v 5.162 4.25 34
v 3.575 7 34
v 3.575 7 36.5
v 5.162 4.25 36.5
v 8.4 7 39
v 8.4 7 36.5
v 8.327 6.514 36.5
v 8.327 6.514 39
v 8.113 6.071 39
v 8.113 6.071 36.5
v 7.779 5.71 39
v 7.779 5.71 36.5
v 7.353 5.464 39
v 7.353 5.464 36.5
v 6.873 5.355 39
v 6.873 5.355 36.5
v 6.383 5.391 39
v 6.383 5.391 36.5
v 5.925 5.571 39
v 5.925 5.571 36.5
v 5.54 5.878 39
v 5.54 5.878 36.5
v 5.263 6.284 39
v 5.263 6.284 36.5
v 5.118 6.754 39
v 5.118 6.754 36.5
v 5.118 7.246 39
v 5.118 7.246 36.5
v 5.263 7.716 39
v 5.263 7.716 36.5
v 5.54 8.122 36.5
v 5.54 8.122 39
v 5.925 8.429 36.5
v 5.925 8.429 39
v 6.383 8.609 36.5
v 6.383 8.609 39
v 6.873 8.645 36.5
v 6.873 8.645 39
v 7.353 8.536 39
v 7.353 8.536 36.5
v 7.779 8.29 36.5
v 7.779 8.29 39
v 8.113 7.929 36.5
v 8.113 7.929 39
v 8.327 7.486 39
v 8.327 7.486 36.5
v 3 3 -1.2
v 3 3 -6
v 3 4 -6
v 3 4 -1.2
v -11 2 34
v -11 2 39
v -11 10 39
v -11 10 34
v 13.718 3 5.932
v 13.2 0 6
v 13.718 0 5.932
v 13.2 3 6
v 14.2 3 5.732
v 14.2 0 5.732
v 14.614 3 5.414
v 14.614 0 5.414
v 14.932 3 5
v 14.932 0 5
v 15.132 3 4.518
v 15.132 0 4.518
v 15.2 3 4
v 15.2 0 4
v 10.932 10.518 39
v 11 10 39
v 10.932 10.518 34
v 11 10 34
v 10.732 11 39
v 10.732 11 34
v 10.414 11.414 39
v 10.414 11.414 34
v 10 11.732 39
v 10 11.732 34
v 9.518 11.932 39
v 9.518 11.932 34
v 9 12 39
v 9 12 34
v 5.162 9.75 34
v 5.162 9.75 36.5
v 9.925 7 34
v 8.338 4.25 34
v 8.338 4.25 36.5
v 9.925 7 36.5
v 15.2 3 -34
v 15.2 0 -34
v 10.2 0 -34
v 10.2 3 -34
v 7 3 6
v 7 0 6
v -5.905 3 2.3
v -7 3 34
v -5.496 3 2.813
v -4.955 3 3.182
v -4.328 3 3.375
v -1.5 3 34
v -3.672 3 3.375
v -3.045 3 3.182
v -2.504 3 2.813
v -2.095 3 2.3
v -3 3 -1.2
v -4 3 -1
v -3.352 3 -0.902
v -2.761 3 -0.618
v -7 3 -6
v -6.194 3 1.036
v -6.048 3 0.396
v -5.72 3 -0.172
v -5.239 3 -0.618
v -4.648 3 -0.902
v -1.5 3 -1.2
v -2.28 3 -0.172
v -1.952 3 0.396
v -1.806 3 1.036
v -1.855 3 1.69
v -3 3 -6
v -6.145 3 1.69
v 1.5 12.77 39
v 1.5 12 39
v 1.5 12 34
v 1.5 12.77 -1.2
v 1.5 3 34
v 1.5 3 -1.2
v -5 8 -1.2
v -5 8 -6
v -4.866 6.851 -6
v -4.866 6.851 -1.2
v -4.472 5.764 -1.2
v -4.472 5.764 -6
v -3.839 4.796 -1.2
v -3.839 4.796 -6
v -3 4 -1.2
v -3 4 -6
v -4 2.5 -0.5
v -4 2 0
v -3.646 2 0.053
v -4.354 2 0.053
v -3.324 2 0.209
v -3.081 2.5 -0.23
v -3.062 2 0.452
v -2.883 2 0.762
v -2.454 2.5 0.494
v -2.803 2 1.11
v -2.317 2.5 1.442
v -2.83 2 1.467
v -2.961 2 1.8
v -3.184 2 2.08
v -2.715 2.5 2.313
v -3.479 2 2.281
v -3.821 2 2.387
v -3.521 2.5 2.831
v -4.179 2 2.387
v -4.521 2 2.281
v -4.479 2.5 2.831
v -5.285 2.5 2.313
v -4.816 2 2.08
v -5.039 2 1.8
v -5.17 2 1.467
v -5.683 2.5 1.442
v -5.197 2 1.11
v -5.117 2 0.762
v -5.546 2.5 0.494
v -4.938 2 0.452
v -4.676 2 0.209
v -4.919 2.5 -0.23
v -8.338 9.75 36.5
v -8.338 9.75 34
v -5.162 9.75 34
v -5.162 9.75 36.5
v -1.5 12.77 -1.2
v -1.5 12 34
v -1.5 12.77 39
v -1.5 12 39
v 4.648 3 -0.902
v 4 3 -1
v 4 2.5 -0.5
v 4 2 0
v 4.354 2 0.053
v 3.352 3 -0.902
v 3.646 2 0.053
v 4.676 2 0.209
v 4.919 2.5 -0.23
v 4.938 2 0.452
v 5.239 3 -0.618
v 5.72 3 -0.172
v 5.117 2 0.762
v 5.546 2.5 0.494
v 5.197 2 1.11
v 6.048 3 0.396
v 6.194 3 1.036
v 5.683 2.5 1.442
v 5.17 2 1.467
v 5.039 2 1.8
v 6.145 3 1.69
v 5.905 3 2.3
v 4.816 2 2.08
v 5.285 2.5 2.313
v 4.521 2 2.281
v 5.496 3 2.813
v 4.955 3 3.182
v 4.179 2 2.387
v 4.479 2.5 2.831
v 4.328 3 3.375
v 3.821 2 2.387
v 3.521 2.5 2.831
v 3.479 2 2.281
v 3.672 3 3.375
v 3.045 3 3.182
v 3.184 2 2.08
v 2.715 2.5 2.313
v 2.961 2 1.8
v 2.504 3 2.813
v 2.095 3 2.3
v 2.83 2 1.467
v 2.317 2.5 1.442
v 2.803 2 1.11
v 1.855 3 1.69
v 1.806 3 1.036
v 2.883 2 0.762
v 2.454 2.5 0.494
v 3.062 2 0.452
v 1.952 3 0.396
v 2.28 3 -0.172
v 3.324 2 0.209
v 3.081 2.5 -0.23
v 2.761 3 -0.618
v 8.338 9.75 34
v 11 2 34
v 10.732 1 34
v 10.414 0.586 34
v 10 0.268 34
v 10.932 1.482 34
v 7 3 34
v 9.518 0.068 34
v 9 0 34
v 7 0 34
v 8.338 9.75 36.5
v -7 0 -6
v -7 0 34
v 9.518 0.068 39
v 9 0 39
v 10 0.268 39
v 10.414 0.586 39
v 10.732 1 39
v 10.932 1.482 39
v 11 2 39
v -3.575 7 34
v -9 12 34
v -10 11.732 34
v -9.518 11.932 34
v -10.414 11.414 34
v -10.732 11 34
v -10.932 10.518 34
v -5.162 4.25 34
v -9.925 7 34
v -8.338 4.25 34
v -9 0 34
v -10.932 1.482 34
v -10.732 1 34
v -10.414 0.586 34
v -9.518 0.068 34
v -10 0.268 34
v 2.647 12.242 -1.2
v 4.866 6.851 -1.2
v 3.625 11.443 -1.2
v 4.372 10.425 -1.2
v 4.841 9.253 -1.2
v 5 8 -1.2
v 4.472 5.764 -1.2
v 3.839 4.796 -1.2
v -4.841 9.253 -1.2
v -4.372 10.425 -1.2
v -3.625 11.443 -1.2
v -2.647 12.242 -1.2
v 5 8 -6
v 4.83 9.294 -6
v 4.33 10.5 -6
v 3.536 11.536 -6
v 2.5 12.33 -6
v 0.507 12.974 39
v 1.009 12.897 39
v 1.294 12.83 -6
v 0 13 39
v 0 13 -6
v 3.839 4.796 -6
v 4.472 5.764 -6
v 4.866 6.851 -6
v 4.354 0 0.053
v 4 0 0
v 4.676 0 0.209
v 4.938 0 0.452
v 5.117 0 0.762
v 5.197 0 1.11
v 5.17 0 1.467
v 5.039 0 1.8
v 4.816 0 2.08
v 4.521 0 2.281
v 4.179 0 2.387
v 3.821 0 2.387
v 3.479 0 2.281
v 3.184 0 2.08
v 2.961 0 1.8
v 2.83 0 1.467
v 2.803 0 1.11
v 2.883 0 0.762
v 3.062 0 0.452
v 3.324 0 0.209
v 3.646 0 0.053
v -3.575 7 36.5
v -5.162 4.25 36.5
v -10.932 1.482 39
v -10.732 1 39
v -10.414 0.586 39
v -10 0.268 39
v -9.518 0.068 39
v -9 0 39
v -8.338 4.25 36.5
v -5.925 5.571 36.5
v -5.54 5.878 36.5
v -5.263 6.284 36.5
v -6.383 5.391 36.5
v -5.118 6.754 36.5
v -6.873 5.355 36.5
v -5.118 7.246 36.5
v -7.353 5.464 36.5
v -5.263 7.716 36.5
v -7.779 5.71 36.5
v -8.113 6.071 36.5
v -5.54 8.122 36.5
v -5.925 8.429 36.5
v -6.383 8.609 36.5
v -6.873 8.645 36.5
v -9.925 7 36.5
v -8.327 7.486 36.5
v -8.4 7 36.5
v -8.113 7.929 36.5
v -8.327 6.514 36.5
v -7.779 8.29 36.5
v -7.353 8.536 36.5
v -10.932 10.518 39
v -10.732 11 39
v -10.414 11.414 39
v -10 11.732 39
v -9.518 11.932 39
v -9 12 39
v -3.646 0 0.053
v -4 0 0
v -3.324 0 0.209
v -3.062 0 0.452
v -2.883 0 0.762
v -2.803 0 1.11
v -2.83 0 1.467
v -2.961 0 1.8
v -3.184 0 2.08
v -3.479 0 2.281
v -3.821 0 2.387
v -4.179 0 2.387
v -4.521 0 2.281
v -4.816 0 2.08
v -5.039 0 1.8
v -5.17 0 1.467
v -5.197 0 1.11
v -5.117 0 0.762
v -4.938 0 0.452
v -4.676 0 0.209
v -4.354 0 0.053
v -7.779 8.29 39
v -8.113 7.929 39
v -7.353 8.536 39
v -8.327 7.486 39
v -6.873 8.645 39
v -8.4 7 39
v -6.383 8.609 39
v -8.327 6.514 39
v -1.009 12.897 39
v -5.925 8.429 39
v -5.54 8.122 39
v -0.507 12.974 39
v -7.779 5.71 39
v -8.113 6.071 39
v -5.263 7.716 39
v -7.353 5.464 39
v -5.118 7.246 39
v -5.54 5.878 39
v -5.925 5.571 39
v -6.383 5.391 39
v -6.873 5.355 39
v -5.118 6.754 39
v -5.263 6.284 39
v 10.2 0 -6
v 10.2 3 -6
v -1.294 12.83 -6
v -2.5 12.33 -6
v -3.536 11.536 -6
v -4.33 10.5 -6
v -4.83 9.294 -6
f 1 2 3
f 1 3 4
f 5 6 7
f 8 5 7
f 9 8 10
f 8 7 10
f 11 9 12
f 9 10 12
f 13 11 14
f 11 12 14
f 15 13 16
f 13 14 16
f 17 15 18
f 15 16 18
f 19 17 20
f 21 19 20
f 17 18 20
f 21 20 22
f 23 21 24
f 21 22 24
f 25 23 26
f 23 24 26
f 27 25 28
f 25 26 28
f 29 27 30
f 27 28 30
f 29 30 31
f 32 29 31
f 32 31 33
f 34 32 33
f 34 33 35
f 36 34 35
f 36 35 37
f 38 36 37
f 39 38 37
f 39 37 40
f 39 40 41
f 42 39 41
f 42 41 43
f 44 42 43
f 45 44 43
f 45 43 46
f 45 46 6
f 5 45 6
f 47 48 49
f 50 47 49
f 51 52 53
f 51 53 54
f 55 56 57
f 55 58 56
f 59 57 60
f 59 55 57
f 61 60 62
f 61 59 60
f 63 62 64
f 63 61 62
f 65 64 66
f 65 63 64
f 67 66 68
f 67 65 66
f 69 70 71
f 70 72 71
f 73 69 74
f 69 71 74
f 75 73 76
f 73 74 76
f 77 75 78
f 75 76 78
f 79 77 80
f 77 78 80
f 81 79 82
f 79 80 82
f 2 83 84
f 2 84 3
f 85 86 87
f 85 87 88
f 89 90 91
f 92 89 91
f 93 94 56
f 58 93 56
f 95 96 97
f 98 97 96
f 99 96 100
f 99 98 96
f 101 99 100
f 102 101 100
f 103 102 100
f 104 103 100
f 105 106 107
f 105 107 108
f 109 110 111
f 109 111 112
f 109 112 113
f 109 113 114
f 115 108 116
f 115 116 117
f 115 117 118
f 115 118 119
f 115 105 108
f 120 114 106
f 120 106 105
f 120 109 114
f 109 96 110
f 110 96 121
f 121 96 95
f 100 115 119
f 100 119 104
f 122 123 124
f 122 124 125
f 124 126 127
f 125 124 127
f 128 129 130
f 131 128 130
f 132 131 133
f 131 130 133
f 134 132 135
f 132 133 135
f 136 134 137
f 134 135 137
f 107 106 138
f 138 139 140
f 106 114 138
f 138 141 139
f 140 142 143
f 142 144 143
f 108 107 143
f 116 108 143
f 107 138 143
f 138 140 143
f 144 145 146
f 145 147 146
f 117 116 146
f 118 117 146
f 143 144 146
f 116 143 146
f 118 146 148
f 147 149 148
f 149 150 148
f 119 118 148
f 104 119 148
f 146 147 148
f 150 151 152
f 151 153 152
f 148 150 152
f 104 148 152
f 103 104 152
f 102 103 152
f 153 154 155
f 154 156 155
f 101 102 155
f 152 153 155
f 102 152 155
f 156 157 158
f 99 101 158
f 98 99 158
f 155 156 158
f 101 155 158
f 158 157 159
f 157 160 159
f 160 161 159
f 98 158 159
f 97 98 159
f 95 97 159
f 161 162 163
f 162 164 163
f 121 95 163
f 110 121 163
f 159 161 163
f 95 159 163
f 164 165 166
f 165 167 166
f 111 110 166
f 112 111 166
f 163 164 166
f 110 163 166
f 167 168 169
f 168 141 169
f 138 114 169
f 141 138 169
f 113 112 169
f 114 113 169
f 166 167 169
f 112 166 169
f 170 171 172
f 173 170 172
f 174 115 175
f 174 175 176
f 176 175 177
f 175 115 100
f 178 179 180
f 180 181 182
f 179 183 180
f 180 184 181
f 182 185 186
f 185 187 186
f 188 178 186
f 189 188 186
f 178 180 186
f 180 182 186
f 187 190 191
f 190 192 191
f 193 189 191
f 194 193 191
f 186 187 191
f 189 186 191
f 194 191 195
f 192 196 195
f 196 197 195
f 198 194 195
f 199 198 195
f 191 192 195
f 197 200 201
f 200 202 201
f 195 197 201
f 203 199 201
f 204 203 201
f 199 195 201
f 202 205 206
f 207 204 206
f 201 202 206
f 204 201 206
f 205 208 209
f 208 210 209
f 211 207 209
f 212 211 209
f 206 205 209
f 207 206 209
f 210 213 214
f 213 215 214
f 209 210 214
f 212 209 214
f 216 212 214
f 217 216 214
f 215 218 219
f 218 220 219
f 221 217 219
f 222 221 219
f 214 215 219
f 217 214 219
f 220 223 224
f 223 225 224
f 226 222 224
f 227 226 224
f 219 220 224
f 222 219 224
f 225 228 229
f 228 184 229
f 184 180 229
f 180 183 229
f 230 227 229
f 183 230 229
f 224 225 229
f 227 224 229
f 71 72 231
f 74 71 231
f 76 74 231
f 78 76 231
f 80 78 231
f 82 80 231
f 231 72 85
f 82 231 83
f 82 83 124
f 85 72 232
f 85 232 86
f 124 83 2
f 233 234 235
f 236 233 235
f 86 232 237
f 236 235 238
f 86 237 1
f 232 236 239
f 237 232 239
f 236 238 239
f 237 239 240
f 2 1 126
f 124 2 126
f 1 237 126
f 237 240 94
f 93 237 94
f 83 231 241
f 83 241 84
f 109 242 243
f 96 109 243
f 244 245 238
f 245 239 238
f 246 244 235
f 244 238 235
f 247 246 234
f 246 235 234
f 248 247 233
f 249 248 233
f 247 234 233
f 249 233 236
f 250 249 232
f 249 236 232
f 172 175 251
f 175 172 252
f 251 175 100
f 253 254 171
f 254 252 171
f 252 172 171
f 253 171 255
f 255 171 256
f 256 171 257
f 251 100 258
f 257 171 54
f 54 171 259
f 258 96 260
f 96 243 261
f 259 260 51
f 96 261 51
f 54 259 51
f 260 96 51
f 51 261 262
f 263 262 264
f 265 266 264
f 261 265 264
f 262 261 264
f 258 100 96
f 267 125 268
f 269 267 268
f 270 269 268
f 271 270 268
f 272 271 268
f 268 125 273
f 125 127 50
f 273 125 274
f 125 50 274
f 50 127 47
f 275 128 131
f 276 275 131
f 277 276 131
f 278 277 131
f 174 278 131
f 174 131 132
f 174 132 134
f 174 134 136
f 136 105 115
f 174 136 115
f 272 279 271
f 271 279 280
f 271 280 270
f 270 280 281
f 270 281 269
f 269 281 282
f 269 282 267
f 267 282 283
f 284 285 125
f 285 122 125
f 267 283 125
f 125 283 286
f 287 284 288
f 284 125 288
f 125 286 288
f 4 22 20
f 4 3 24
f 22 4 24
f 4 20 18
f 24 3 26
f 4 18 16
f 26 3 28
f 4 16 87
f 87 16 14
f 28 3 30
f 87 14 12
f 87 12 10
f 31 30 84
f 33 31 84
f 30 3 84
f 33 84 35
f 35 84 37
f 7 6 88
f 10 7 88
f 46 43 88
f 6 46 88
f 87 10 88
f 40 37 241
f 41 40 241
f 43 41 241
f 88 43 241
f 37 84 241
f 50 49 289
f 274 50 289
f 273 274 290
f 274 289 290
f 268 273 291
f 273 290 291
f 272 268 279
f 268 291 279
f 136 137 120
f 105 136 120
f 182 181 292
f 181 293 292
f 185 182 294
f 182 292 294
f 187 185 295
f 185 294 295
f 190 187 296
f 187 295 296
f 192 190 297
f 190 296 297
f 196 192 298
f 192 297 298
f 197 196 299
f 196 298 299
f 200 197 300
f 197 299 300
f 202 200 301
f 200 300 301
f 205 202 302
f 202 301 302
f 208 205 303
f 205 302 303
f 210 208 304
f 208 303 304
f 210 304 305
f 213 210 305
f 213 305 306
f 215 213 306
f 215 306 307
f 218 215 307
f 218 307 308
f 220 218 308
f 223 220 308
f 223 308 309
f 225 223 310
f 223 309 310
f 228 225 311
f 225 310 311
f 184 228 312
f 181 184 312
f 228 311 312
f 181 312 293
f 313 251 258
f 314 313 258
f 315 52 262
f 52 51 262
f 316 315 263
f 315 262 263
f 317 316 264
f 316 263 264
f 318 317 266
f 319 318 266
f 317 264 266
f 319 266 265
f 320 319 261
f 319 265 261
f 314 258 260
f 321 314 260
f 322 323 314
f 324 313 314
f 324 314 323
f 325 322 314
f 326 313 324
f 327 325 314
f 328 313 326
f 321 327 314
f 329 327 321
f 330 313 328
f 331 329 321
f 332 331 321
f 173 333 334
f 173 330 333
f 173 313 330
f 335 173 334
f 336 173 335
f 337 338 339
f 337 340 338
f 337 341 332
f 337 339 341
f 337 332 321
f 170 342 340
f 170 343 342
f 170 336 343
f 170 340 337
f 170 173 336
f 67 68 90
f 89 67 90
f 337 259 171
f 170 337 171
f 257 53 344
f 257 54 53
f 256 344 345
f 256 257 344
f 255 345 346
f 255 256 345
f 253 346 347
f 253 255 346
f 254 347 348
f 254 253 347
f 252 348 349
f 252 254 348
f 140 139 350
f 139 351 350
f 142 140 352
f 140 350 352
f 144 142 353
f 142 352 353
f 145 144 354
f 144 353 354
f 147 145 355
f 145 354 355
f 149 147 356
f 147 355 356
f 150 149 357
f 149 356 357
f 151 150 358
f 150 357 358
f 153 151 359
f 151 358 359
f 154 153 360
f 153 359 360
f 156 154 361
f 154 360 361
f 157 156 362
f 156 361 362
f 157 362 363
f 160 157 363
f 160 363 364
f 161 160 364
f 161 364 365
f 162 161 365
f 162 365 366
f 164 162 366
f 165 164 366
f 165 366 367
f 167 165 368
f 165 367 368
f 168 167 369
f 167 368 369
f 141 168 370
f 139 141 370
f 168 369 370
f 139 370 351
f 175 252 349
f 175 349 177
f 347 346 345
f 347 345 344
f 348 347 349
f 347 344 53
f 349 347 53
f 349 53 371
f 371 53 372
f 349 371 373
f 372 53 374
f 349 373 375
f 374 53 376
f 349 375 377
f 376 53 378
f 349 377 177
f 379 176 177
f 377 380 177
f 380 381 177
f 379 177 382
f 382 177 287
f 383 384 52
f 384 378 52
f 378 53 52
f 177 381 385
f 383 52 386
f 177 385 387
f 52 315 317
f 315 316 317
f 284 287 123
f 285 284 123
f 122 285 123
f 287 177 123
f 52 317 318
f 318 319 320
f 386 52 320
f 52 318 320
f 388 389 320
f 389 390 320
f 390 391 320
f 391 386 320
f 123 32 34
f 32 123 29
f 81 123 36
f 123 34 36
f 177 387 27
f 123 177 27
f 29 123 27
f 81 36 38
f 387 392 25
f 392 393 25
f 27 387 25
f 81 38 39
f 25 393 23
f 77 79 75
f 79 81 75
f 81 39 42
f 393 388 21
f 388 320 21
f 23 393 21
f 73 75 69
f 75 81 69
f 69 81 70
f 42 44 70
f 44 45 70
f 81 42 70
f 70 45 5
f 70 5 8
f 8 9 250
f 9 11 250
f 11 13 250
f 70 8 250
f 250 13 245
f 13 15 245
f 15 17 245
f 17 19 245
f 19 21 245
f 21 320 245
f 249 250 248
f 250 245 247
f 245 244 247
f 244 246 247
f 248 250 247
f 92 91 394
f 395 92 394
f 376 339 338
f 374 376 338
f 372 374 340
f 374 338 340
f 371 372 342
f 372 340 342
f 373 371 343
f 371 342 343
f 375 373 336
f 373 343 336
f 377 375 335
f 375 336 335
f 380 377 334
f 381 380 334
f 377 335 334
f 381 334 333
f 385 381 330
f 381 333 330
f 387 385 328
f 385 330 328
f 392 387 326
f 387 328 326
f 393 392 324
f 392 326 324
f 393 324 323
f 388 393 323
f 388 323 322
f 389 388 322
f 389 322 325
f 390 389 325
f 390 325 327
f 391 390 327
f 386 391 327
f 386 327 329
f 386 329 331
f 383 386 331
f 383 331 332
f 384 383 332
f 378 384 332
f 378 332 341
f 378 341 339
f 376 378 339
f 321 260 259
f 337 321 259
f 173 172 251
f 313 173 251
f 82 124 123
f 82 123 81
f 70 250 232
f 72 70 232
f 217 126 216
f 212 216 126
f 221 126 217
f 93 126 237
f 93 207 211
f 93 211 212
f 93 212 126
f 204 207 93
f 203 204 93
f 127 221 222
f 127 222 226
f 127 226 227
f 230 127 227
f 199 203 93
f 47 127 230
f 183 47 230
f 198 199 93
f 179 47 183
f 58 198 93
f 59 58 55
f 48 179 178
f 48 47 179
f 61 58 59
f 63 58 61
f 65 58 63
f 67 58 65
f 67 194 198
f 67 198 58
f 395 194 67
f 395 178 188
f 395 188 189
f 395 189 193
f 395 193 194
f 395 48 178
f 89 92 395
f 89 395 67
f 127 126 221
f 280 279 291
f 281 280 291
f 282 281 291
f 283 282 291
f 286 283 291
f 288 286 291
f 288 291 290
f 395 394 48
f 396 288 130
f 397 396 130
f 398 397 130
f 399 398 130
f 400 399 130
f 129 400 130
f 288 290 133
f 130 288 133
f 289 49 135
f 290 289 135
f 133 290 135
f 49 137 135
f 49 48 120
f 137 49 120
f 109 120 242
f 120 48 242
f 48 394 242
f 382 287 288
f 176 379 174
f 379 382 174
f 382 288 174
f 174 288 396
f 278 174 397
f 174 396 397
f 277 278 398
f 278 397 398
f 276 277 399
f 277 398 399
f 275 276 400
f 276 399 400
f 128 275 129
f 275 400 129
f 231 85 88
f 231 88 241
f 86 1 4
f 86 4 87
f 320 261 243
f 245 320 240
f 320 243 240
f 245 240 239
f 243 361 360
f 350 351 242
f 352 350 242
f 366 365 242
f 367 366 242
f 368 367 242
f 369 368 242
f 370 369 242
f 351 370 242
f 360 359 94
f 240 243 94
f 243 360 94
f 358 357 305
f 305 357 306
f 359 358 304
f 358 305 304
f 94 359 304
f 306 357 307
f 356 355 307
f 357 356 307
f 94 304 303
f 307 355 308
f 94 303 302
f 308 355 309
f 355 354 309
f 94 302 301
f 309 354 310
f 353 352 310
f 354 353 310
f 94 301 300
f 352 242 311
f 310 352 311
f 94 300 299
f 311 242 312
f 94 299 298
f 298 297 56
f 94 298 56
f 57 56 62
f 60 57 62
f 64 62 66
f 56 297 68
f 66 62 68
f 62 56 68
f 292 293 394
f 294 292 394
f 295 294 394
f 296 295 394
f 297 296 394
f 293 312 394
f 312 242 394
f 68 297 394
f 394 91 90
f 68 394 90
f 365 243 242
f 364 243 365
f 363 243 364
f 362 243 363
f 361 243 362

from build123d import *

# Parameters (mm, degrees)
SKETCH1_R                                           = 1.15
BOSS_EXTRUDE1_DEPTH                                 = 3
BOSS_EXTRUDE3_DEPTH                                 = 10
CSK_FOR_M2_COUNTERSUNK_FLAT_HEAD_SCREW2_D           = 2.4
CSK_FOR_M2_COUNTERSUNK_FLAT_HEAD_SCREW2_CSINK_D     = 4.4
CSK_FOR_M2_COUNTERSUNK_FLAT_HEAD_SCREW2_CSINK_ANGLE = 90
CUT_EXTRUDE2_DEPTH                                  = 50.244695146
SKETCH1_4_W                                         = 22
SKETCH1_4_H                                         = 5
BOSS_EXTRUDE4_DEPTH                                 = 12
SKETCH7_R                                           = 1.65
CUT_EXTRUDE3_DEPTH                                  = 71.880462752
CUT_EXTRUDE4_DEPTH                                  = 2.5
FILLET2_R                                           = 2


with BuildPart() as part:
    # Sketch1 → Boss-Extrude1 (new body)
    with BuildSketch(Plane(origin=(0, 0, 0), x_dir=(1, 0, 0), z_dir=(0, 1, 0))):
        Polygon((7, -6), (15.2, -6), (15.2, 34), (10.2, 34), (10.2, 6), (-7, 6), (-7, -39), (7, -39), align=None)
        with Locations((4, -1.2)):
            Circle(SKETCH1_R, mode=Mode.SUBTRACT)
        with Locations((-4, -1.2)):
            Circle(SKETCH1_R, mode=Mode.SUBTRACT)
    extrude(amount=BOSS_EXTRUDE1_DEPTH)

    # Sketch3 → Boss-Extrude3 (add)
    with BuildSketch(Plane(origin=(0, 3, 0), x_dir=(1, 0, 0), z_dir=(0, 1, 0))):
        Polygon((-5, 1.2), (-1.5, 1.2), (-1.5, -39), (1.5, -39), (1.5, 1.2), (5, 1.2), (5, 6), (-5, 6), align=None)
    extrude(amount=BOSS_EXTRUDE3_DEPTH)

    # CSK for M2 Countersunk Flat Head Screw2 (through all)
    with Locations(Plane(origin=(-4, 3, 1.2), x_dir=(0, 0, 1), z_dir=(0, 1, 0))):
        with Locations((0, 0), (0, 8)):
            CounterSinkHole(CSK_FOR_M2_COUNTERSUNK_FLAT_HEAD_SCREW2_D / 2, CSK_FOR_M2_COUNTERSUNK_FLAT_HEAD_SCREW2_CSINK_D / 2, counter_sink_angle=CSK_FOR_M2_COUNTERSUNK_FLAT_HEAD_SCREW2_CSINK_ANGLE)

    # Sketch6 → Cut-Extrude2 (cut, through all)
    with BuildSketch(Plane(origin=(0, 0, -6), x_dir=(-1, 0, 0), z_dir=(0, 0, -1))):
        with BuildLine():
            Line((-5, 3), (-3, 3))
            Line((-3, 3), (-3, 4))
            ThreePointArc((-3, 4), (-4.472135952, 5.763932017), (-5, 7.999999988))
            Line((-5, 7.999999988), (-5, 3))
        make_face()
        with BuildLine():
            Line((5, 3), (5, 8))
            ThreePointArc((5, 8), (4.472135955, 5.763932023), (3, 4))
            Line((3, 4), (3, 3))
            Line((3, 3), (5, 3))
        make_face()
        with BuildLine():
            Line((5, 13), (0, 13))
            ThreePointArc((0, 13), (3.535533906, 11.535533906), (5, 8))
            Line((5, 8), (5, 13))
        make_face()
        with BuildLine():
            Line((-5, 13), (-5, 7.999999988))
            ThreePointArc((-5, 7.999999988), (-3.53553391, 11.535533902), (0, 13))
            Line((0, 13), (-5, 13))
        make_face()
    extrude(amount=-CUT_EXTRUDE2_DEPTH, mode=Mode.SUBTRACT)

    # Sketch1<4> → Boss-Extrude4 (add)
    with BuildSketch(Plane(origin=(0, 0, 0), x_dir=(1, 0, 0), z_dir=(0, 1, 0))):
        with Locations((0, -36.5)):
            Rectangle(SKETCH1_4_W, SKETCH1_4_H)
    extrude(amount=BOSS_EXTRUDE4_DEPTH)

    # Sketch7 → Cut-Extrude3 (cut, through all)
    with BuildSketch(Plane(origin=(0, 0, 34), x_dir=(-1, 0, 0), z_dir=(0, 0, -1))):
        with Locations((6.75, 7)):
            Circle(SKETCH7_R)
        with Locations((-6.75, 7)):
            Circle(SKETCH7_R)
    extrude(amount=-CUT_EXTRUDE3_DEPTH, mode=Mode.SUBTRACT)

    # Sketch7<3> → Cut-Extrude4 (cut)
    with BuildSketch(Plane(origin=(0, 0, 34), x_dir=(-1, 0, 0), z_dir=(0, 0, -1))):
        Polygon((5.16228676, 9.75), (3.574573519, 7), (5.16228676, 4.25), (8.33771324, 4.25), (9.925426481, 7), (8.33771324, 9.75), align=None)
        Polygon((-5.16228676, 9.75), (-3.574573519, 7), (-5.16228676, 4.25), (-8.33771324, 4.25), (-9.925426481, 7), (-8.33771324, 9.75), align=None)
    extrude(amount=-CUT_EXTRUDE4_DEPTH, mode=Mode.SUBTRACT)

    # Fillet2
    fillet2_edges = [part.edges().sort_by_distance(p)[0] for p in [
        (15.2, 1.5, 6),
        (-11, 12, 36.5),
        (-11, 0, 36.5),
        (11, 0, 36.5),
        (11, 12, 36.5),
    ]]
    fillet(fillet2_edges, radius=FILLET2_R)


solid = part.part
